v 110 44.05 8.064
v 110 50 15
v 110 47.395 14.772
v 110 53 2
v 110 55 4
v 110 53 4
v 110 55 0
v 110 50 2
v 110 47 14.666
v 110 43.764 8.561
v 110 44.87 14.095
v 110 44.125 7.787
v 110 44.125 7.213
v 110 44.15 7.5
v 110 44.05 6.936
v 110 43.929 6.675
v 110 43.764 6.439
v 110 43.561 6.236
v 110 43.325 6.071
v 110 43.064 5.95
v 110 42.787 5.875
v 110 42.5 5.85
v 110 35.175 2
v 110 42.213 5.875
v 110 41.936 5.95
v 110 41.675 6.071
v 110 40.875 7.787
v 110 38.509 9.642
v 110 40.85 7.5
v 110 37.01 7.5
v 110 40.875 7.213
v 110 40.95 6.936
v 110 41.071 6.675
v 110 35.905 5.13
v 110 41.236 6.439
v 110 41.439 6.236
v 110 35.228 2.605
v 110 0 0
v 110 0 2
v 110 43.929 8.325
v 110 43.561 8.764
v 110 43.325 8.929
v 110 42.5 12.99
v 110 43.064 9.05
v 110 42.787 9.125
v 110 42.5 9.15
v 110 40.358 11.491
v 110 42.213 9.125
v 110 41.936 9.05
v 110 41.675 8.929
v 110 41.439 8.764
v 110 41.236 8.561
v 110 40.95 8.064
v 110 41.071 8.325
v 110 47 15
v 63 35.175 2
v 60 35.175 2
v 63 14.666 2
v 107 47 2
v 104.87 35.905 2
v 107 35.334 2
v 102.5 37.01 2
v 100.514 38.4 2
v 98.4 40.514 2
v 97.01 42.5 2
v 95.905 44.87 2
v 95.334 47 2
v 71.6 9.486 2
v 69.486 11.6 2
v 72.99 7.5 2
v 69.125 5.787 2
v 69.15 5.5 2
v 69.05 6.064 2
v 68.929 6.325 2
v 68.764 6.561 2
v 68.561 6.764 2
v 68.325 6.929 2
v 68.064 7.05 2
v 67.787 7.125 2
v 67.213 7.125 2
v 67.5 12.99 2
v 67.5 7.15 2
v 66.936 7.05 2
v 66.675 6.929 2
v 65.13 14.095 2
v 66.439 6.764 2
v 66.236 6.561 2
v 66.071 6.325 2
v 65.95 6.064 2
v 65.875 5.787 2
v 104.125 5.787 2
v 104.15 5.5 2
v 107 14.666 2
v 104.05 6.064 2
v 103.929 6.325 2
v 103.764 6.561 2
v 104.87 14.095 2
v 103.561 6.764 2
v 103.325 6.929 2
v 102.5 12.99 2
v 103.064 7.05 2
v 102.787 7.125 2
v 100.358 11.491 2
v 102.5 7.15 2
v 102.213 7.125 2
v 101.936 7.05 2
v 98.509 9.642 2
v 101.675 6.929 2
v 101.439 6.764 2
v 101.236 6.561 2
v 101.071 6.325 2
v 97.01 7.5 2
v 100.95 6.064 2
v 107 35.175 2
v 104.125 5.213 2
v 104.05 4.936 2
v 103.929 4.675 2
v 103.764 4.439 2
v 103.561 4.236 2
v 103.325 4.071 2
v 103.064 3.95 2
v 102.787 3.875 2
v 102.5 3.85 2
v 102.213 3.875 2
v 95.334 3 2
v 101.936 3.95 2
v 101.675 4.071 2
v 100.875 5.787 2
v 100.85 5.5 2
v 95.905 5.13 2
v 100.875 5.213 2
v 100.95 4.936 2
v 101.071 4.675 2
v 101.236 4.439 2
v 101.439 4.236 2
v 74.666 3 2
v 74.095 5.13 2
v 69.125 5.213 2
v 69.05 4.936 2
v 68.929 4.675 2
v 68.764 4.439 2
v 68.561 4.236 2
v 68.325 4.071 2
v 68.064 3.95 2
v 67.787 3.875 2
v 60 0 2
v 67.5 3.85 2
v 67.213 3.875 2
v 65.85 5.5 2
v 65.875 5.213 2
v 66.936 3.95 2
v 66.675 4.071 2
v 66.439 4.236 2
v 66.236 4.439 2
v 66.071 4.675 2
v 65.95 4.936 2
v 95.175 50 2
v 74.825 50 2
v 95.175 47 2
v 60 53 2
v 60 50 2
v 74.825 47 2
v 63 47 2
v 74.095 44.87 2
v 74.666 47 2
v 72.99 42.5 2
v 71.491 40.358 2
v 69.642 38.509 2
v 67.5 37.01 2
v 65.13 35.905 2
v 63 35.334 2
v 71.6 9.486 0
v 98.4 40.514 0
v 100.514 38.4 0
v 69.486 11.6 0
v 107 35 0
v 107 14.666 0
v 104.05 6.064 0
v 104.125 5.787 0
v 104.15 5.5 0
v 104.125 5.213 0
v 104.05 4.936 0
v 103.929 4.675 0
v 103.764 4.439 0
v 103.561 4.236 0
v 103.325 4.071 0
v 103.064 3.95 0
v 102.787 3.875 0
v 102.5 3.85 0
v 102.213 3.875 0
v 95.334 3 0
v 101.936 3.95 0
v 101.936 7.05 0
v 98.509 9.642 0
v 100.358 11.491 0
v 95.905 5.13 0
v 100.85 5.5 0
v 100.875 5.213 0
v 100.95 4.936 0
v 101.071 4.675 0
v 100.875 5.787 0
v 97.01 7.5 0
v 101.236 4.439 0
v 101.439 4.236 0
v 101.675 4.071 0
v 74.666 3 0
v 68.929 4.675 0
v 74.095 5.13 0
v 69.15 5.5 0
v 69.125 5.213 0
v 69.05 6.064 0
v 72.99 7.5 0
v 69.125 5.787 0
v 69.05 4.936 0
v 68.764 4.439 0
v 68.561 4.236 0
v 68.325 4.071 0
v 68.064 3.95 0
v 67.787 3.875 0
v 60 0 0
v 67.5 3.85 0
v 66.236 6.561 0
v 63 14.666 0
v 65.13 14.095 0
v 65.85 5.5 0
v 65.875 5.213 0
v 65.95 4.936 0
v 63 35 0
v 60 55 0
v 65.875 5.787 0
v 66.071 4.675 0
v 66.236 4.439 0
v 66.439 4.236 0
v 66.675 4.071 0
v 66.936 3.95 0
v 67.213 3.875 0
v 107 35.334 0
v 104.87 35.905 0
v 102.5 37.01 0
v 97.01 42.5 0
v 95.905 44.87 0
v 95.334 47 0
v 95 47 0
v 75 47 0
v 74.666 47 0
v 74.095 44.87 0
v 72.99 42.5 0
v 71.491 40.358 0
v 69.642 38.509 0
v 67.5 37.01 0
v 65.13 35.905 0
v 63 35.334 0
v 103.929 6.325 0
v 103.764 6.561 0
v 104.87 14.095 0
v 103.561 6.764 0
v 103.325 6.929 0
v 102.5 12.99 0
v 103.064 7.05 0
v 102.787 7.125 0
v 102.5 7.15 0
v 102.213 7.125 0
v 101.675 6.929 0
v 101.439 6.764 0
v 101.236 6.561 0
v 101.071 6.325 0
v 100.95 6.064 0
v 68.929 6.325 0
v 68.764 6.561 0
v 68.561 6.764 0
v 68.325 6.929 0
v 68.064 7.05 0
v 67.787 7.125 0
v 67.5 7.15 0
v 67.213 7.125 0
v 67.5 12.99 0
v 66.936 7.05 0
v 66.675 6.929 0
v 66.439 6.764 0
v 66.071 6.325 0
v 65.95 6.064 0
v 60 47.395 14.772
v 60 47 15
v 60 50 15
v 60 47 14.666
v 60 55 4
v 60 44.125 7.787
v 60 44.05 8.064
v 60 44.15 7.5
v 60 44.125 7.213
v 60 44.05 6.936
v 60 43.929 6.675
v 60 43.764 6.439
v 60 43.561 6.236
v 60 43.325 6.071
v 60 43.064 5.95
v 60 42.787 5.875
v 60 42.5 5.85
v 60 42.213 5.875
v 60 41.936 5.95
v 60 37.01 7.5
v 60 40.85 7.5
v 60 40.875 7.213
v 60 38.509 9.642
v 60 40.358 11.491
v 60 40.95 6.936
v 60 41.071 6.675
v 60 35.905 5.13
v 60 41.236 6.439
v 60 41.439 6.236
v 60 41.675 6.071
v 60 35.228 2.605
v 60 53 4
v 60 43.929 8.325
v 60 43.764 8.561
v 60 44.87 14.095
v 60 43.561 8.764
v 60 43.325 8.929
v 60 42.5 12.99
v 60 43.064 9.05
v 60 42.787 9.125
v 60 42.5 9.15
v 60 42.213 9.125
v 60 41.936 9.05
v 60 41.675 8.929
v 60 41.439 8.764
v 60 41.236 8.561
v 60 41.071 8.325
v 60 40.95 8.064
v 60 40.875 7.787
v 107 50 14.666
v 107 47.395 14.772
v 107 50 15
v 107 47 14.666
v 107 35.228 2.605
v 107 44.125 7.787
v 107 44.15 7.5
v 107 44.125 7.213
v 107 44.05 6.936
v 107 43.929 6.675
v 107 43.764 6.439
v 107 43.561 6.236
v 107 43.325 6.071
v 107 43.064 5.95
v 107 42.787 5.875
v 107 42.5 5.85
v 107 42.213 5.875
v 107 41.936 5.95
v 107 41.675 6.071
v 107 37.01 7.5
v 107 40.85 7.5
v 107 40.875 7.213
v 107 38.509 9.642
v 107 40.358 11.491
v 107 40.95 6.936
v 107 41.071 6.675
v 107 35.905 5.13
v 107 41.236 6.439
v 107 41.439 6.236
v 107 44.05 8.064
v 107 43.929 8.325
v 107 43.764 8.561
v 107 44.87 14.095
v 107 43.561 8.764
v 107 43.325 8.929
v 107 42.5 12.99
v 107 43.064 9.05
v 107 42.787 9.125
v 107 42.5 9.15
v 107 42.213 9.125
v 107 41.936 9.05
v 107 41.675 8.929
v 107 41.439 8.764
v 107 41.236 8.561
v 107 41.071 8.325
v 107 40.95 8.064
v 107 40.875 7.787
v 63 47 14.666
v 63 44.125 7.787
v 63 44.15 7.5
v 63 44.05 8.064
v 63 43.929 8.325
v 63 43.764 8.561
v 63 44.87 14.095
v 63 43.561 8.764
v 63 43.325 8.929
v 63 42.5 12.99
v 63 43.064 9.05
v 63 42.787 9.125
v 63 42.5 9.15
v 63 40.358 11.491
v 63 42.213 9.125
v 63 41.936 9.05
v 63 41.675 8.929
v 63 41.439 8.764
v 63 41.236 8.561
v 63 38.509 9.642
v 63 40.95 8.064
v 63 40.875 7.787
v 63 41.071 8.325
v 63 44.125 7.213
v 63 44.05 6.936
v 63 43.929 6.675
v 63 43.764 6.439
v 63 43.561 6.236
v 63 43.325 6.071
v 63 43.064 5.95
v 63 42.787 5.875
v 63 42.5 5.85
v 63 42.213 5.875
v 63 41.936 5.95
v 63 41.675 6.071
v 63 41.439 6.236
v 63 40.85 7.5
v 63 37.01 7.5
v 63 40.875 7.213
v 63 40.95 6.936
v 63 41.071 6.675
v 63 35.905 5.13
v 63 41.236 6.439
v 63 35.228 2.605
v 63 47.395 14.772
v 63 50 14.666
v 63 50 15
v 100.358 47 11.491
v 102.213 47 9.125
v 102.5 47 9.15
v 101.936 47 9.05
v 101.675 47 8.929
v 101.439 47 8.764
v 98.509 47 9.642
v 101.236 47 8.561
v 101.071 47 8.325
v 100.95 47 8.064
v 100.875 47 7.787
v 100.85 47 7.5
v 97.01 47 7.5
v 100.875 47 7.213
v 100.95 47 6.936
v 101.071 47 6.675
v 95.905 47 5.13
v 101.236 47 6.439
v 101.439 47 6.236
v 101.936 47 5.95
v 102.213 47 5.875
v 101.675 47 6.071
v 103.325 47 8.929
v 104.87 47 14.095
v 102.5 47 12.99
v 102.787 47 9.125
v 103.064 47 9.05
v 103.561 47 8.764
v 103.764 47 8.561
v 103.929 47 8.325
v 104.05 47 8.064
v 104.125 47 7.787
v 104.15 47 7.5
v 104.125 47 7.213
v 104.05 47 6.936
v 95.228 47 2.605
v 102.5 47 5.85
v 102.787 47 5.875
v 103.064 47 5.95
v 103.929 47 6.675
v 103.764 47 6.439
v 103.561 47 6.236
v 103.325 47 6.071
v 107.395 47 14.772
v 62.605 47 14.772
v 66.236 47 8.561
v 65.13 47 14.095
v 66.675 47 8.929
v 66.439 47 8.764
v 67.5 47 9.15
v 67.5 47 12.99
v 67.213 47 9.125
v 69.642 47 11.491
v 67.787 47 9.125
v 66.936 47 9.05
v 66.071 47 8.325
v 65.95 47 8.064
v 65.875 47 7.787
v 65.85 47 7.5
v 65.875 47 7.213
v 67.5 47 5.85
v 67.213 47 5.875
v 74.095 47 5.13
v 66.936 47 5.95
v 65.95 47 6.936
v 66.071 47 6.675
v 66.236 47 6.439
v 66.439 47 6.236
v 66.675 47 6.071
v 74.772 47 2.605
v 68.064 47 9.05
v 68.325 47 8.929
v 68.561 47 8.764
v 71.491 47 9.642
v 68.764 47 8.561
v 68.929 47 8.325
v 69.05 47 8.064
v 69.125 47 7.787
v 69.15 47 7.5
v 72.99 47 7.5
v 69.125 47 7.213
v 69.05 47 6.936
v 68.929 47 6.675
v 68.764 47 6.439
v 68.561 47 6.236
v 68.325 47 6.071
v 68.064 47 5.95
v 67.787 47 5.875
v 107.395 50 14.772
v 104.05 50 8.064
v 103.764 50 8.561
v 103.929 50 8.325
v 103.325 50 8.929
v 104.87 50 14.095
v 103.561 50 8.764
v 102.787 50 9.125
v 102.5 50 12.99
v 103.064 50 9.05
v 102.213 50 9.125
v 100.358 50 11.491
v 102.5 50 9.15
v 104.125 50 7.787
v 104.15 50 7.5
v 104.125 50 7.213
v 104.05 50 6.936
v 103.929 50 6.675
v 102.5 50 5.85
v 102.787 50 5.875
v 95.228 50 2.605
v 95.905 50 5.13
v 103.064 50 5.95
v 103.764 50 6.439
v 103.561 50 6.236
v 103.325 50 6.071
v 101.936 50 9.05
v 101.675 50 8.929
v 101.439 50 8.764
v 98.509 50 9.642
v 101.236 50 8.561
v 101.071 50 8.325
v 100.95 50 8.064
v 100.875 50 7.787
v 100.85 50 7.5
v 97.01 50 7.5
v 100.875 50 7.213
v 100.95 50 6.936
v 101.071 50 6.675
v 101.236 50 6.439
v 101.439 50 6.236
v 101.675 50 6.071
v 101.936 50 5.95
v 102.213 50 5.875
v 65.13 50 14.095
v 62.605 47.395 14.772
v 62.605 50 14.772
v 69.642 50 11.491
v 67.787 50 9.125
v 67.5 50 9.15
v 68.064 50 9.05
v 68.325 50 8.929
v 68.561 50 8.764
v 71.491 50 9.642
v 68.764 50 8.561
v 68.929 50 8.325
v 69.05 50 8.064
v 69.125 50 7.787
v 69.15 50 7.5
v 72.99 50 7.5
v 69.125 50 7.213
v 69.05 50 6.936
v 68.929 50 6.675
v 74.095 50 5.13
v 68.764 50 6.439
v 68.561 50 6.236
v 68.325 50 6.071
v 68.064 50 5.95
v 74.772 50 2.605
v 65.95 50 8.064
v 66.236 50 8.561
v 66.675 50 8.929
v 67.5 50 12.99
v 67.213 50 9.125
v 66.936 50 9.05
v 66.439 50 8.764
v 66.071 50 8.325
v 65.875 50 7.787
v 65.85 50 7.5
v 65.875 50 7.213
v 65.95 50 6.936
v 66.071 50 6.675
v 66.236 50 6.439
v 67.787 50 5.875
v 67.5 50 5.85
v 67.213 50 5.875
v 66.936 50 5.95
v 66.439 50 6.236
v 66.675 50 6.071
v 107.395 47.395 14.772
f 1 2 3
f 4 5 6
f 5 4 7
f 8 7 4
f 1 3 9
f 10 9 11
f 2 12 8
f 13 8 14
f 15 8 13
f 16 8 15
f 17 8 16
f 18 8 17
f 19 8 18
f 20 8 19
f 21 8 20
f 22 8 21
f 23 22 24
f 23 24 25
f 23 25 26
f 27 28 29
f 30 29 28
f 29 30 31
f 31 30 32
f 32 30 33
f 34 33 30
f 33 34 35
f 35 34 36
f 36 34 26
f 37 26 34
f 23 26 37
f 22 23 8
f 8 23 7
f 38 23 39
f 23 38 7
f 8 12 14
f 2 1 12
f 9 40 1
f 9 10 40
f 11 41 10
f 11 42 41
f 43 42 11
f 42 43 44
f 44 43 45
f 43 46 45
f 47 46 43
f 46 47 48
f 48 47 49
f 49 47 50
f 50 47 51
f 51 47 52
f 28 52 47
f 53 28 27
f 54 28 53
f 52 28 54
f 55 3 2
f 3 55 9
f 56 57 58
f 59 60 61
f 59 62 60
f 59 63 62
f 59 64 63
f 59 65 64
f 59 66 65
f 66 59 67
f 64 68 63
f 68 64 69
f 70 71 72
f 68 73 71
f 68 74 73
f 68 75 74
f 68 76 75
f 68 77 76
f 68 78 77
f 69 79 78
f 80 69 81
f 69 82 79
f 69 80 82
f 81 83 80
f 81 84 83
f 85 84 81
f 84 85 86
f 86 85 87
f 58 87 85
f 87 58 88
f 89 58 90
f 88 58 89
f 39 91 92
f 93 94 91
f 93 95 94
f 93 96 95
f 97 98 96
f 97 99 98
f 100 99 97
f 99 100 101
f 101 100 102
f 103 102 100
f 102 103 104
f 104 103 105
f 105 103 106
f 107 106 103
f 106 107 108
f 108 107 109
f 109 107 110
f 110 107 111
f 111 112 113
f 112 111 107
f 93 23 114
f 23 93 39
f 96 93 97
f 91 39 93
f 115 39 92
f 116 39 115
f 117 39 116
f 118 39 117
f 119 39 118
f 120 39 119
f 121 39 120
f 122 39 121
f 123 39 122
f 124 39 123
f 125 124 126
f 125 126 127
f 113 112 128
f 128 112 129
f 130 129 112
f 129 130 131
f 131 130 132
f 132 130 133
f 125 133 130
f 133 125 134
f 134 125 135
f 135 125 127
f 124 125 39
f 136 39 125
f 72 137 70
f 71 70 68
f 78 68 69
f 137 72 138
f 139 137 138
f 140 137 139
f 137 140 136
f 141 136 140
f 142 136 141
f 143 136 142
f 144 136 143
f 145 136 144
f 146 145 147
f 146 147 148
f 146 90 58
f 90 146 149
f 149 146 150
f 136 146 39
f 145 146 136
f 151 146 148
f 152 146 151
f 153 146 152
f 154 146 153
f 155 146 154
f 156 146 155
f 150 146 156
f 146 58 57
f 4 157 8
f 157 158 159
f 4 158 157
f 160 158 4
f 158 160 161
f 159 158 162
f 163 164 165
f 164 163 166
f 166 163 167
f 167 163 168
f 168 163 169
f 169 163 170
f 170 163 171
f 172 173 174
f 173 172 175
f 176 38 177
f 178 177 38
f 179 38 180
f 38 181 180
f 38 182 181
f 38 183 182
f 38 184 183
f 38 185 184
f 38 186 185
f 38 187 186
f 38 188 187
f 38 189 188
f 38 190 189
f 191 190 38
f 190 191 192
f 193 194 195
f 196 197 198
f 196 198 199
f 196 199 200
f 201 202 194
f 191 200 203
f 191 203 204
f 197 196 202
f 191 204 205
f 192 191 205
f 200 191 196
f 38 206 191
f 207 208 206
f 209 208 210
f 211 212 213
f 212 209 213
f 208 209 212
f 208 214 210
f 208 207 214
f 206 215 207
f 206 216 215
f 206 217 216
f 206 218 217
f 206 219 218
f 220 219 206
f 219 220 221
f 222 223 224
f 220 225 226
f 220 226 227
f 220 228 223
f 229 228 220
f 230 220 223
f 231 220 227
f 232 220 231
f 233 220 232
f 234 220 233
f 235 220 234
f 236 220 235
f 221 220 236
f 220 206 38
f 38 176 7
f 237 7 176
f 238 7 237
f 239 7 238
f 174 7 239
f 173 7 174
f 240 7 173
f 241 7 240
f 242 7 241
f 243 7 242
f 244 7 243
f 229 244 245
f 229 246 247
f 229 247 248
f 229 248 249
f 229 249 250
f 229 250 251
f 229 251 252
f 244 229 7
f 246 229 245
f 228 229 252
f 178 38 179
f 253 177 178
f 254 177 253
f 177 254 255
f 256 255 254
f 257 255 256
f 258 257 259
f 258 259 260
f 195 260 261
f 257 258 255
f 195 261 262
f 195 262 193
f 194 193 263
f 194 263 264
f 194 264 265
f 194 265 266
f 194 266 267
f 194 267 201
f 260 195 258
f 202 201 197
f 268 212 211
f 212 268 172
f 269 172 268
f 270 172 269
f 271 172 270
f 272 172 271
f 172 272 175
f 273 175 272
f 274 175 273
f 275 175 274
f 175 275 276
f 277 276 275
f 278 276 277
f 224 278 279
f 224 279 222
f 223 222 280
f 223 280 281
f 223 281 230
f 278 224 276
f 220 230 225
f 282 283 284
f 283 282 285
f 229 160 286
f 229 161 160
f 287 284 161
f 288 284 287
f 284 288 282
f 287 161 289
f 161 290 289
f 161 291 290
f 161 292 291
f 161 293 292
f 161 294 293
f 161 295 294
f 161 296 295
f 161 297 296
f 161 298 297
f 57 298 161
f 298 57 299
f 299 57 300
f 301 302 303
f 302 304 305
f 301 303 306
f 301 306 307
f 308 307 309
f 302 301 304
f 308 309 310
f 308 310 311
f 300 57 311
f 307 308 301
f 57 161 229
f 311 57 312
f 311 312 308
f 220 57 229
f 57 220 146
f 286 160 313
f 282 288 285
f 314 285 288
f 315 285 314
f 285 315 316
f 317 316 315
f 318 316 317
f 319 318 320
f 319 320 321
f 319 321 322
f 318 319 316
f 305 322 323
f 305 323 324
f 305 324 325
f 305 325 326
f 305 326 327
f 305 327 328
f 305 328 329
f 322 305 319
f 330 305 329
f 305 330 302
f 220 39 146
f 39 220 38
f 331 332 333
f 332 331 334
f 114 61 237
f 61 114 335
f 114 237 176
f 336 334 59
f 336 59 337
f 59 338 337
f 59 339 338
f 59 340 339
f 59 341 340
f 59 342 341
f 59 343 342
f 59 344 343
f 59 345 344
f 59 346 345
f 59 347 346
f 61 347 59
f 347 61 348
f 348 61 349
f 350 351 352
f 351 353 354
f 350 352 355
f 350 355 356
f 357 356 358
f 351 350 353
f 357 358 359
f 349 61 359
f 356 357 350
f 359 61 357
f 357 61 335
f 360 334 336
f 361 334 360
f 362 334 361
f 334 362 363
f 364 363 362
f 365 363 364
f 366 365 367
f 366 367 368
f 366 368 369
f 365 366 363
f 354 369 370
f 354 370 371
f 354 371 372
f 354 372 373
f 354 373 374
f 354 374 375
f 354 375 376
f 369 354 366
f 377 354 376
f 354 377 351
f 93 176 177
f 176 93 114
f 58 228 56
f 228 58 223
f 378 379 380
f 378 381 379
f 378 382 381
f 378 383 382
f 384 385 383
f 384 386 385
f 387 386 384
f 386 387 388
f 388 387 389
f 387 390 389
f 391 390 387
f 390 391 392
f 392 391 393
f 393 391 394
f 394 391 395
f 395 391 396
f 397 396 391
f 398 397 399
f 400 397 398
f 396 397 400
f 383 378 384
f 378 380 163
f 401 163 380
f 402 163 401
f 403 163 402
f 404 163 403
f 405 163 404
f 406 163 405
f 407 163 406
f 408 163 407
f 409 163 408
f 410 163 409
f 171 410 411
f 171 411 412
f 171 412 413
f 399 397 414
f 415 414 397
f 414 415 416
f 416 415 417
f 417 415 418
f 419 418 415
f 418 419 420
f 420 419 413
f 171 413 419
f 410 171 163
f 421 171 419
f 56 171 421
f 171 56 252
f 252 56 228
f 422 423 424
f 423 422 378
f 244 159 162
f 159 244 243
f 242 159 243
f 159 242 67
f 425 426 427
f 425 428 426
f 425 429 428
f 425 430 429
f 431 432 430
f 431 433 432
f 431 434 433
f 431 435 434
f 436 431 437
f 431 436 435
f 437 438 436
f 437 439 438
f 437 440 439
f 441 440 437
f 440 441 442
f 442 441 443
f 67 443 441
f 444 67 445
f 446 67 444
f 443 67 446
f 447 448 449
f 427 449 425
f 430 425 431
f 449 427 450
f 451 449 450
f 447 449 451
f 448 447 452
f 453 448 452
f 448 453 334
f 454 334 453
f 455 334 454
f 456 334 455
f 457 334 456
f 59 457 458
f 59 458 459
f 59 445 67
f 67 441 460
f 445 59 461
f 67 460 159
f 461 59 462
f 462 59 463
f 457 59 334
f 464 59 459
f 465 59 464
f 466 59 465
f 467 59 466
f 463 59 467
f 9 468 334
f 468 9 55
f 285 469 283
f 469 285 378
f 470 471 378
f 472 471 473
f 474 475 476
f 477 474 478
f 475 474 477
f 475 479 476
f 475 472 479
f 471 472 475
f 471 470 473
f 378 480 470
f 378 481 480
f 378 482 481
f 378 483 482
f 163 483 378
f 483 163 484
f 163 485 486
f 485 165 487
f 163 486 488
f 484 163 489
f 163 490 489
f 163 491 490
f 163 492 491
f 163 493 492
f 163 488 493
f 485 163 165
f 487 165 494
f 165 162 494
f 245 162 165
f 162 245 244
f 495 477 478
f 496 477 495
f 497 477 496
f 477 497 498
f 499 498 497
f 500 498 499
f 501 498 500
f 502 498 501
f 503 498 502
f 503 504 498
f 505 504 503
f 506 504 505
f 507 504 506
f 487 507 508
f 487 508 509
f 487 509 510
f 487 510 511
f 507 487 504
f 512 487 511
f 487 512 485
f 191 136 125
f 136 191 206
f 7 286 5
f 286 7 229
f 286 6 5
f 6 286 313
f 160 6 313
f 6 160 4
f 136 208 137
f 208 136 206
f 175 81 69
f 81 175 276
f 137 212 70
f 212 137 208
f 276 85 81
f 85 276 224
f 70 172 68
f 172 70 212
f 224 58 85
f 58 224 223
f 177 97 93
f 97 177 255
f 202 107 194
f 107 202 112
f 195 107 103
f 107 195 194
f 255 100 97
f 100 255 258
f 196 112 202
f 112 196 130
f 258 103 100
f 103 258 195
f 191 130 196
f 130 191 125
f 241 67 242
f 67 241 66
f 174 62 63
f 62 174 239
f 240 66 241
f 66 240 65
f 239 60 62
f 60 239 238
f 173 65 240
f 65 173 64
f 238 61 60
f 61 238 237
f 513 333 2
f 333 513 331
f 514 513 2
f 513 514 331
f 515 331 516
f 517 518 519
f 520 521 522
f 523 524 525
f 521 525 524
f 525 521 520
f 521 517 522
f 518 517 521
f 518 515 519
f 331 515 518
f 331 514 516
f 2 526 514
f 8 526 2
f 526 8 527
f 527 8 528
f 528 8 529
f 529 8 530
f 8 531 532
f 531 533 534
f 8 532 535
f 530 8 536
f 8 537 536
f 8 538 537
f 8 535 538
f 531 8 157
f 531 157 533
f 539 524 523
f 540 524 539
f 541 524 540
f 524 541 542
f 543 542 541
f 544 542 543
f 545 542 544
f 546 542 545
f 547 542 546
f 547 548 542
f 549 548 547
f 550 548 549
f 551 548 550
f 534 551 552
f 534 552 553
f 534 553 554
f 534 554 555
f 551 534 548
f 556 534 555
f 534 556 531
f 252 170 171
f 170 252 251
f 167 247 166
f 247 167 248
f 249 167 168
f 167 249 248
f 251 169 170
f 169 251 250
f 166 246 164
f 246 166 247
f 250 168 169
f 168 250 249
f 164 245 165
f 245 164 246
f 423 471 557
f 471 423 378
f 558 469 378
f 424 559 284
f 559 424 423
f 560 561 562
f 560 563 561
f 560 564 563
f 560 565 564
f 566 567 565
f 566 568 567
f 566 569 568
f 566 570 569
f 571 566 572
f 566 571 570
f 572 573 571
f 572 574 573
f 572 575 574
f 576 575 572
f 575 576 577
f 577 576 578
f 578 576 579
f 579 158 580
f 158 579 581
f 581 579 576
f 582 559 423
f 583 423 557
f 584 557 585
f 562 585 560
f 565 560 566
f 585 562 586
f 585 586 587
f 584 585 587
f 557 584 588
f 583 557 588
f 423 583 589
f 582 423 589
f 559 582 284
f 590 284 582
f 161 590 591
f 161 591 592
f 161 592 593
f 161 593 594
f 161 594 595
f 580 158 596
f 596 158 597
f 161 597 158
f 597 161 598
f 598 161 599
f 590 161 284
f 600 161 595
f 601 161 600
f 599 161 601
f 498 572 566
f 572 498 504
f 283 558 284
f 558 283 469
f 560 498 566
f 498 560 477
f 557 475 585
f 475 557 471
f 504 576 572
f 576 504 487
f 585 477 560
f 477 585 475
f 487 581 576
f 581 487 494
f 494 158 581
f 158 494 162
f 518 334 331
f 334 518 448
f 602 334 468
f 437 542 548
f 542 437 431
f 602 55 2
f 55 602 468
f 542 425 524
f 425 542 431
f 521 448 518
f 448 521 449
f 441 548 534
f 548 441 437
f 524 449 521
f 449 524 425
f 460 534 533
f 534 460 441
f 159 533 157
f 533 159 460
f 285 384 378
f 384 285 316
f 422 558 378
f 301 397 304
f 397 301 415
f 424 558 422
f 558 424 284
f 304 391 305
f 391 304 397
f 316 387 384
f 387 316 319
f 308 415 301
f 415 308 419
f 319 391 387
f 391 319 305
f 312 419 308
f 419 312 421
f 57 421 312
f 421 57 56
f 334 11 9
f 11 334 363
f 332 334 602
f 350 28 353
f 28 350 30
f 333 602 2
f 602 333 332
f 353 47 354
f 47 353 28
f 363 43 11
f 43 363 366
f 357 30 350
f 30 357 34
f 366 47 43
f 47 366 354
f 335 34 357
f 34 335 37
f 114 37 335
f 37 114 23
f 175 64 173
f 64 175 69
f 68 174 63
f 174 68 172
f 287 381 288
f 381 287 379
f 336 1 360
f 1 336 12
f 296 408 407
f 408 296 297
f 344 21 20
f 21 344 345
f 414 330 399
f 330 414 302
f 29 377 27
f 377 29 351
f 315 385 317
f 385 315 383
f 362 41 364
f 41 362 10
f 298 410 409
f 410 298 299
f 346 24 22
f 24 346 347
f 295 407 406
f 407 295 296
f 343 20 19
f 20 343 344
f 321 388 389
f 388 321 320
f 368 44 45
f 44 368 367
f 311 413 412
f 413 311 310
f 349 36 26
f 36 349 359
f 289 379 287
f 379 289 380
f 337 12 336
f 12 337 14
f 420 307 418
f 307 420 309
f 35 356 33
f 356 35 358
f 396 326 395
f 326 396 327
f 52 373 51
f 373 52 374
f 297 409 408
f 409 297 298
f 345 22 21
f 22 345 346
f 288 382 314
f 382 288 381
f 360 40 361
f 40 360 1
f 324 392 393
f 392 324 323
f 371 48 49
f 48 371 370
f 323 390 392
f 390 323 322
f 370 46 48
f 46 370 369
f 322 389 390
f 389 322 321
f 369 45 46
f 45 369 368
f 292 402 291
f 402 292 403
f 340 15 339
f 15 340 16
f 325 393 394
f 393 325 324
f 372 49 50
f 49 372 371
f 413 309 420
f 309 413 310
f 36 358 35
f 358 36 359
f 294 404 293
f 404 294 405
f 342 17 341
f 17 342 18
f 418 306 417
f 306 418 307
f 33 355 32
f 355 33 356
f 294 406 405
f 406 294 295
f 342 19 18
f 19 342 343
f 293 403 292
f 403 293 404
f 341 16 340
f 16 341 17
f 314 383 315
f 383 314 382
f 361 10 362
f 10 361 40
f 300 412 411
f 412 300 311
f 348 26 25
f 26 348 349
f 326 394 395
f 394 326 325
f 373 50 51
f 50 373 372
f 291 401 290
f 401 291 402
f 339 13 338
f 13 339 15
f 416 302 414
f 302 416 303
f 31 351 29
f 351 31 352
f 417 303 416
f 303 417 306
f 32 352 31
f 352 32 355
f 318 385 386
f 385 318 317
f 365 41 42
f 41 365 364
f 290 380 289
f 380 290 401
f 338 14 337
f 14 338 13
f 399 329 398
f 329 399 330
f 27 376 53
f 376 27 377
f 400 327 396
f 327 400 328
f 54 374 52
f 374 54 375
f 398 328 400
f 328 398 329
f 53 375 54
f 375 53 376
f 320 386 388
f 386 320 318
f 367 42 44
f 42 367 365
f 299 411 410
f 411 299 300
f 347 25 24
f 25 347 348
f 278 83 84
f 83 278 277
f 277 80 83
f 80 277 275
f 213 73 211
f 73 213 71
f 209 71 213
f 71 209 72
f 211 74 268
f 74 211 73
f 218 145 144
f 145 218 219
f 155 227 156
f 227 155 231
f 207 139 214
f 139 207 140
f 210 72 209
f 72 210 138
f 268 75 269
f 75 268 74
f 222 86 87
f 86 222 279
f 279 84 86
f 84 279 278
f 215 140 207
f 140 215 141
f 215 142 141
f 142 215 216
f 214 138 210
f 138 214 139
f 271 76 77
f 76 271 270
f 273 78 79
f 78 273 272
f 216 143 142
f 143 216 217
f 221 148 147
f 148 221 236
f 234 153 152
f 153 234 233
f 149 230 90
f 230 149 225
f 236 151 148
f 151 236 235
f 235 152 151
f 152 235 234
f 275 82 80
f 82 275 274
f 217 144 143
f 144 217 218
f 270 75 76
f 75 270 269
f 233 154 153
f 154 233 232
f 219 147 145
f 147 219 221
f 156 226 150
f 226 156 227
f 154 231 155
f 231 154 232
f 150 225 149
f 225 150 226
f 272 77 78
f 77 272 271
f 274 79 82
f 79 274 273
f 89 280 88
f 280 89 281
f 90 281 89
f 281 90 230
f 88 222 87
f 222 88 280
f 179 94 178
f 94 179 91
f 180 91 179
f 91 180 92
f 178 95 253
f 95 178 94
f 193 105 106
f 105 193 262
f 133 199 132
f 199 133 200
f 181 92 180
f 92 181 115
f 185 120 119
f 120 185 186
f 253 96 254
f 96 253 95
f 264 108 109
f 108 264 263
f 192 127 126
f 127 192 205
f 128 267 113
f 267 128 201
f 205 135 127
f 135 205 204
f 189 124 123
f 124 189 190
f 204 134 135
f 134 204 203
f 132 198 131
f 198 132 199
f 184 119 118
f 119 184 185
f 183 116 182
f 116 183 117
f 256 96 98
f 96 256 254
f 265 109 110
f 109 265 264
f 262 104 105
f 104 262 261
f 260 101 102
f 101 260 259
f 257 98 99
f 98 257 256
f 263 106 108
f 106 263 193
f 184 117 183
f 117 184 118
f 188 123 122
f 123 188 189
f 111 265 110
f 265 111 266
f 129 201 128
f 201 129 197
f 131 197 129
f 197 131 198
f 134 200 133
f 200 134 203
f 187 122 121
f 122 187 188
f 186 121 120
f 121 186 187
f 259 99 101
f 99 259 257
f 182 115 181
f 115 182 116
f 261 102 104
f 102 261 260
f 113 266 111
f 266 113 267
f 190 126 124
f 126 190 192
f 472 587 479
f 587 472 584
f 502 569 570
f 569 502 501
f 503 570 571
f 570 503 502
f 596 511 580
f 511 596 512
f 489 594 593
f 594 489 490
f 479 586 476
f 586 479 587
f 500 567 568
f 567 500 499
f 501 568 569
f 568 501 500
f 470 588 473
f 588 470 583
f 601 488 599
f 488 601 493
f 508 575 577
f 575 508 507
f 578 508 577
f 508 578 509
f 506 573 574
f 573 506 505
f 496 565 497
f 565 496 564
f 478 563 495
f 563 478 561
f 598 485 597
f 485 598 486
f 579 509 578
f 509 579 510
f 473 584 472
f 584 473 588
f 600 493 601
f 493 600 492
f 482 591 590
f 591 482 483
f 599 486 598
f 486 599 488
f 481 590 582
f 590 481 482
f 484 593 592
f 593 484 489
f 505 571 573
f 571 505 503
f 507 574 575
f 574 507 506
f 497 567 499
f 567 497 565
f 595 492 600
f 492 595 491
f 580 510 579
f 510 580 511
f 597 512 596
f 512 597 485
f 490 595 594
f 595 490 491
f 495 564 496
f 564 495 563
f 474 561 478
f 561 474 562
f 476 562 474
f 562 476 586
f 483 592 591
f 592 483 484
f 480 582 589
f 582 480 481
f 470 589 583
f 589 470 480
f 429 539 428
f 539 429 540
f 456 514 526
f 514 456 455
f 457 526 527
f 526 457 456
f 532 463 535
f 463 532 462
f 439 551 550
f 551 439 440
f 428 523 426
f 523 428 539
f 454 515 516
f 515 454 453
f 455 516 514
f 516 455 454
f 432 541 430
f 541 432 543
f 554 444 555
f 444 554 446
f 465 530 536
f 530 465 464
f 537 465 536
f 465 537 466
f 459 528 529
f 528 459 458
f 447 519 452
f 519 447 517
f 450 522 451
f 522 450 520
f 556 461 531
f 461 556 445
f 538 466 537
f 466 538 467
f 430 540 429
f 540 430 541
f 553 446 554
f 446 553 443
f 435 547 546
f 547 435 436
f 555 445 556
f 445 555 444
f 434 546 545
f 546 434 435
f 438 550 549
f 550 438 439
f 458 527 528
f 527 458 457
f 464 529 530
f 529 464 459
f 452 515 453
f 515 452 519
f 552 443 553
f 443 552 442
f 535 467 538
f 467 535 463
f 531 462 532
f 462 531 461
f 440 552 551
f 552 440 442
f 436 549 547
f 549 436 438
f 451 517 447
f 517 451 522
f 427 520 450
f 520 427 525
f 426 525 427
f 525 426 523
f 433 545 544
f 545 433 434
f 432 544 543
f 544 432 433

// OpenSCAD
3dprint=1;

$fn=36;
e = 0.1;  // epsilon for fixing mesh visuals
th=2;     // thickness of frame
w=3;      // width of frame and braces
s=50;     // size of side edge
v=50;    // vertical size, tall
br=1.65;  // bolt radius
sr=15;   // suport quarter circles radius
gap_scaling=1.5;

module quartercircle(r1,thickness) {
  difference(){
    cylinder(r=r1,h=thickness);  
    translate([0,-r1,-e]) cube([r1*2,r1*2,thickness+e+e]);
    translate([-r1,0,-e]) cube([r1*2,r1*2,thickness+e+e]);
    }
  }

module truss(brace_style=2, edge_style=1) {
   difference(){  
     union(){
        difference(){
          cube([v,s,th]);
          translate([w,w,-1]) cube([v-w*2, s-w*2,th+2]);
        }
        
        if(edge_style==1){
          translate([0,s,0]) cube([v,th+(th*gap_scaling),th]);
          translate([0,s+(th*gap_scaling),th]) cube([v,th,th]);
        }
        
        if((brace_style==1) || (brace_style==3)){
          hull(){
            translate([w,w,0]) cylinder(r=w/2,h=th);
            translate([v-w,s-w,0]) cylinder(r=w/2,h=th);  
          }
        }
        if((brace_style==2) || (brace_style==3)){
          hull(){
            translate([w,s-w,0]) cylinder(r=w/2,h=th);  
            translate([v-w,w,0]) cylinder(r=w/2,h=th);
          }
        }
        translate([0,0,0]) rotate([0,0,180]) quartercircle(sr,th);  //frame
        translate([v,0,0]) rotate([0,0,270]) quartercircle(sr,th);  //frame
        translate([v,s,0]) rotate([0,0,0]) quartercircle(sr,th);    //frame
        translate([0,s,0]) rotate([0,0,90]) quartercircle(sr,th);   //frame

        translate([0,s-w,0]) rotate([0,90,90]) quartercircle(sr,w);  //joiner
        translate([v,s,0]) rotate([0,90,270]) quartercircle(sr,w);   //joiner

        translate([0,s,0]) rotate([0,90,0]) quartercircle(sr,w);  //top
        translate([v-w,s,0]) rotate([0,90,0]) quartercircle(sr,w);  //bottom
     }
        //holes
        translate([-e,s-sr/2,sr/2]) rotate([0,90,0]) cylinder(r=br,h=v+e+e); // base+top
        
        translate([sr/2,sr/2-th,-e]) rotate([0,0,0]) cylinder(r=br,h=th*5);    // non bracket edge
        translate([v-sr/2,sr/2-th,-e]) rotate([0,0,0]) cylinder(r=br,h=th*5);  // non bracket edge

        translate([sr/2,s+e,sr/2]) rotate([90,0,0]) cylinder(r=br,h=th*5);  // bracket side
        translate([v-sr/2,s+e,sr/2]) rotate([90,0,0]) cylinder(r=br,h=th*5); // bracket side


   }
}

// helpder module to rotate frame to vertical
module truss1(p1) {
  translate([0,0,s]) rotate([0,90,0]) truss(p1);
}

module frame1(p1){
translate([-th,0,0]) rotate([0,0,0]) truss1(p1);
translate([s+th,s,0]) rotate([0,0,180]) truss1(p1);
translate([s,-th,0]) rotate([0,0,90]) truss1(p1);
translate([0,s+th,0]) rotate([0,0,270]) truss1(p1);
}

module hbrace(){
      $fn=72;
      difference(){
        union(){
          translate([0,0,-th]) cube([s,s,th]);
        }
          translate([s/2,s/2,-th*3]) cylinder(r=s/2-th, h=th*4);
          //holes
          translate([sr/2,sr/2-th,-th-e]) cylinder(r=br, h=th*4);
          translate([s-sr/2+th,sr/2,-th-e]) cylinder(r=br, h=th*4);
          translate([s-sr/2,s-sr/2+th,-th-e]) cylinder(r=br, h=th*4);
          translate([sr/2-th,s-sr/2,-th-e]) cylinder(r=br, h=th*4);
      }
}

if(3dprint==1) {
  translate([s*1.2,0,0]) truss(1);
} else {  //demo
  translate([s*1.2,0,0]) truss(1);
  translate([0, 0, v/2]) frame1(1);
  translate([0, 0, -v/2]) frame1(2);
  translate([s*1.2,s*1.2,0]) truss(2);
  translate([s*1.2,s*2.4,0]) truss(3);
  translate([0,-s*1.2,0]) color("green") hbrace();
  translate([0,0,0]) color("green") hbrace();}
